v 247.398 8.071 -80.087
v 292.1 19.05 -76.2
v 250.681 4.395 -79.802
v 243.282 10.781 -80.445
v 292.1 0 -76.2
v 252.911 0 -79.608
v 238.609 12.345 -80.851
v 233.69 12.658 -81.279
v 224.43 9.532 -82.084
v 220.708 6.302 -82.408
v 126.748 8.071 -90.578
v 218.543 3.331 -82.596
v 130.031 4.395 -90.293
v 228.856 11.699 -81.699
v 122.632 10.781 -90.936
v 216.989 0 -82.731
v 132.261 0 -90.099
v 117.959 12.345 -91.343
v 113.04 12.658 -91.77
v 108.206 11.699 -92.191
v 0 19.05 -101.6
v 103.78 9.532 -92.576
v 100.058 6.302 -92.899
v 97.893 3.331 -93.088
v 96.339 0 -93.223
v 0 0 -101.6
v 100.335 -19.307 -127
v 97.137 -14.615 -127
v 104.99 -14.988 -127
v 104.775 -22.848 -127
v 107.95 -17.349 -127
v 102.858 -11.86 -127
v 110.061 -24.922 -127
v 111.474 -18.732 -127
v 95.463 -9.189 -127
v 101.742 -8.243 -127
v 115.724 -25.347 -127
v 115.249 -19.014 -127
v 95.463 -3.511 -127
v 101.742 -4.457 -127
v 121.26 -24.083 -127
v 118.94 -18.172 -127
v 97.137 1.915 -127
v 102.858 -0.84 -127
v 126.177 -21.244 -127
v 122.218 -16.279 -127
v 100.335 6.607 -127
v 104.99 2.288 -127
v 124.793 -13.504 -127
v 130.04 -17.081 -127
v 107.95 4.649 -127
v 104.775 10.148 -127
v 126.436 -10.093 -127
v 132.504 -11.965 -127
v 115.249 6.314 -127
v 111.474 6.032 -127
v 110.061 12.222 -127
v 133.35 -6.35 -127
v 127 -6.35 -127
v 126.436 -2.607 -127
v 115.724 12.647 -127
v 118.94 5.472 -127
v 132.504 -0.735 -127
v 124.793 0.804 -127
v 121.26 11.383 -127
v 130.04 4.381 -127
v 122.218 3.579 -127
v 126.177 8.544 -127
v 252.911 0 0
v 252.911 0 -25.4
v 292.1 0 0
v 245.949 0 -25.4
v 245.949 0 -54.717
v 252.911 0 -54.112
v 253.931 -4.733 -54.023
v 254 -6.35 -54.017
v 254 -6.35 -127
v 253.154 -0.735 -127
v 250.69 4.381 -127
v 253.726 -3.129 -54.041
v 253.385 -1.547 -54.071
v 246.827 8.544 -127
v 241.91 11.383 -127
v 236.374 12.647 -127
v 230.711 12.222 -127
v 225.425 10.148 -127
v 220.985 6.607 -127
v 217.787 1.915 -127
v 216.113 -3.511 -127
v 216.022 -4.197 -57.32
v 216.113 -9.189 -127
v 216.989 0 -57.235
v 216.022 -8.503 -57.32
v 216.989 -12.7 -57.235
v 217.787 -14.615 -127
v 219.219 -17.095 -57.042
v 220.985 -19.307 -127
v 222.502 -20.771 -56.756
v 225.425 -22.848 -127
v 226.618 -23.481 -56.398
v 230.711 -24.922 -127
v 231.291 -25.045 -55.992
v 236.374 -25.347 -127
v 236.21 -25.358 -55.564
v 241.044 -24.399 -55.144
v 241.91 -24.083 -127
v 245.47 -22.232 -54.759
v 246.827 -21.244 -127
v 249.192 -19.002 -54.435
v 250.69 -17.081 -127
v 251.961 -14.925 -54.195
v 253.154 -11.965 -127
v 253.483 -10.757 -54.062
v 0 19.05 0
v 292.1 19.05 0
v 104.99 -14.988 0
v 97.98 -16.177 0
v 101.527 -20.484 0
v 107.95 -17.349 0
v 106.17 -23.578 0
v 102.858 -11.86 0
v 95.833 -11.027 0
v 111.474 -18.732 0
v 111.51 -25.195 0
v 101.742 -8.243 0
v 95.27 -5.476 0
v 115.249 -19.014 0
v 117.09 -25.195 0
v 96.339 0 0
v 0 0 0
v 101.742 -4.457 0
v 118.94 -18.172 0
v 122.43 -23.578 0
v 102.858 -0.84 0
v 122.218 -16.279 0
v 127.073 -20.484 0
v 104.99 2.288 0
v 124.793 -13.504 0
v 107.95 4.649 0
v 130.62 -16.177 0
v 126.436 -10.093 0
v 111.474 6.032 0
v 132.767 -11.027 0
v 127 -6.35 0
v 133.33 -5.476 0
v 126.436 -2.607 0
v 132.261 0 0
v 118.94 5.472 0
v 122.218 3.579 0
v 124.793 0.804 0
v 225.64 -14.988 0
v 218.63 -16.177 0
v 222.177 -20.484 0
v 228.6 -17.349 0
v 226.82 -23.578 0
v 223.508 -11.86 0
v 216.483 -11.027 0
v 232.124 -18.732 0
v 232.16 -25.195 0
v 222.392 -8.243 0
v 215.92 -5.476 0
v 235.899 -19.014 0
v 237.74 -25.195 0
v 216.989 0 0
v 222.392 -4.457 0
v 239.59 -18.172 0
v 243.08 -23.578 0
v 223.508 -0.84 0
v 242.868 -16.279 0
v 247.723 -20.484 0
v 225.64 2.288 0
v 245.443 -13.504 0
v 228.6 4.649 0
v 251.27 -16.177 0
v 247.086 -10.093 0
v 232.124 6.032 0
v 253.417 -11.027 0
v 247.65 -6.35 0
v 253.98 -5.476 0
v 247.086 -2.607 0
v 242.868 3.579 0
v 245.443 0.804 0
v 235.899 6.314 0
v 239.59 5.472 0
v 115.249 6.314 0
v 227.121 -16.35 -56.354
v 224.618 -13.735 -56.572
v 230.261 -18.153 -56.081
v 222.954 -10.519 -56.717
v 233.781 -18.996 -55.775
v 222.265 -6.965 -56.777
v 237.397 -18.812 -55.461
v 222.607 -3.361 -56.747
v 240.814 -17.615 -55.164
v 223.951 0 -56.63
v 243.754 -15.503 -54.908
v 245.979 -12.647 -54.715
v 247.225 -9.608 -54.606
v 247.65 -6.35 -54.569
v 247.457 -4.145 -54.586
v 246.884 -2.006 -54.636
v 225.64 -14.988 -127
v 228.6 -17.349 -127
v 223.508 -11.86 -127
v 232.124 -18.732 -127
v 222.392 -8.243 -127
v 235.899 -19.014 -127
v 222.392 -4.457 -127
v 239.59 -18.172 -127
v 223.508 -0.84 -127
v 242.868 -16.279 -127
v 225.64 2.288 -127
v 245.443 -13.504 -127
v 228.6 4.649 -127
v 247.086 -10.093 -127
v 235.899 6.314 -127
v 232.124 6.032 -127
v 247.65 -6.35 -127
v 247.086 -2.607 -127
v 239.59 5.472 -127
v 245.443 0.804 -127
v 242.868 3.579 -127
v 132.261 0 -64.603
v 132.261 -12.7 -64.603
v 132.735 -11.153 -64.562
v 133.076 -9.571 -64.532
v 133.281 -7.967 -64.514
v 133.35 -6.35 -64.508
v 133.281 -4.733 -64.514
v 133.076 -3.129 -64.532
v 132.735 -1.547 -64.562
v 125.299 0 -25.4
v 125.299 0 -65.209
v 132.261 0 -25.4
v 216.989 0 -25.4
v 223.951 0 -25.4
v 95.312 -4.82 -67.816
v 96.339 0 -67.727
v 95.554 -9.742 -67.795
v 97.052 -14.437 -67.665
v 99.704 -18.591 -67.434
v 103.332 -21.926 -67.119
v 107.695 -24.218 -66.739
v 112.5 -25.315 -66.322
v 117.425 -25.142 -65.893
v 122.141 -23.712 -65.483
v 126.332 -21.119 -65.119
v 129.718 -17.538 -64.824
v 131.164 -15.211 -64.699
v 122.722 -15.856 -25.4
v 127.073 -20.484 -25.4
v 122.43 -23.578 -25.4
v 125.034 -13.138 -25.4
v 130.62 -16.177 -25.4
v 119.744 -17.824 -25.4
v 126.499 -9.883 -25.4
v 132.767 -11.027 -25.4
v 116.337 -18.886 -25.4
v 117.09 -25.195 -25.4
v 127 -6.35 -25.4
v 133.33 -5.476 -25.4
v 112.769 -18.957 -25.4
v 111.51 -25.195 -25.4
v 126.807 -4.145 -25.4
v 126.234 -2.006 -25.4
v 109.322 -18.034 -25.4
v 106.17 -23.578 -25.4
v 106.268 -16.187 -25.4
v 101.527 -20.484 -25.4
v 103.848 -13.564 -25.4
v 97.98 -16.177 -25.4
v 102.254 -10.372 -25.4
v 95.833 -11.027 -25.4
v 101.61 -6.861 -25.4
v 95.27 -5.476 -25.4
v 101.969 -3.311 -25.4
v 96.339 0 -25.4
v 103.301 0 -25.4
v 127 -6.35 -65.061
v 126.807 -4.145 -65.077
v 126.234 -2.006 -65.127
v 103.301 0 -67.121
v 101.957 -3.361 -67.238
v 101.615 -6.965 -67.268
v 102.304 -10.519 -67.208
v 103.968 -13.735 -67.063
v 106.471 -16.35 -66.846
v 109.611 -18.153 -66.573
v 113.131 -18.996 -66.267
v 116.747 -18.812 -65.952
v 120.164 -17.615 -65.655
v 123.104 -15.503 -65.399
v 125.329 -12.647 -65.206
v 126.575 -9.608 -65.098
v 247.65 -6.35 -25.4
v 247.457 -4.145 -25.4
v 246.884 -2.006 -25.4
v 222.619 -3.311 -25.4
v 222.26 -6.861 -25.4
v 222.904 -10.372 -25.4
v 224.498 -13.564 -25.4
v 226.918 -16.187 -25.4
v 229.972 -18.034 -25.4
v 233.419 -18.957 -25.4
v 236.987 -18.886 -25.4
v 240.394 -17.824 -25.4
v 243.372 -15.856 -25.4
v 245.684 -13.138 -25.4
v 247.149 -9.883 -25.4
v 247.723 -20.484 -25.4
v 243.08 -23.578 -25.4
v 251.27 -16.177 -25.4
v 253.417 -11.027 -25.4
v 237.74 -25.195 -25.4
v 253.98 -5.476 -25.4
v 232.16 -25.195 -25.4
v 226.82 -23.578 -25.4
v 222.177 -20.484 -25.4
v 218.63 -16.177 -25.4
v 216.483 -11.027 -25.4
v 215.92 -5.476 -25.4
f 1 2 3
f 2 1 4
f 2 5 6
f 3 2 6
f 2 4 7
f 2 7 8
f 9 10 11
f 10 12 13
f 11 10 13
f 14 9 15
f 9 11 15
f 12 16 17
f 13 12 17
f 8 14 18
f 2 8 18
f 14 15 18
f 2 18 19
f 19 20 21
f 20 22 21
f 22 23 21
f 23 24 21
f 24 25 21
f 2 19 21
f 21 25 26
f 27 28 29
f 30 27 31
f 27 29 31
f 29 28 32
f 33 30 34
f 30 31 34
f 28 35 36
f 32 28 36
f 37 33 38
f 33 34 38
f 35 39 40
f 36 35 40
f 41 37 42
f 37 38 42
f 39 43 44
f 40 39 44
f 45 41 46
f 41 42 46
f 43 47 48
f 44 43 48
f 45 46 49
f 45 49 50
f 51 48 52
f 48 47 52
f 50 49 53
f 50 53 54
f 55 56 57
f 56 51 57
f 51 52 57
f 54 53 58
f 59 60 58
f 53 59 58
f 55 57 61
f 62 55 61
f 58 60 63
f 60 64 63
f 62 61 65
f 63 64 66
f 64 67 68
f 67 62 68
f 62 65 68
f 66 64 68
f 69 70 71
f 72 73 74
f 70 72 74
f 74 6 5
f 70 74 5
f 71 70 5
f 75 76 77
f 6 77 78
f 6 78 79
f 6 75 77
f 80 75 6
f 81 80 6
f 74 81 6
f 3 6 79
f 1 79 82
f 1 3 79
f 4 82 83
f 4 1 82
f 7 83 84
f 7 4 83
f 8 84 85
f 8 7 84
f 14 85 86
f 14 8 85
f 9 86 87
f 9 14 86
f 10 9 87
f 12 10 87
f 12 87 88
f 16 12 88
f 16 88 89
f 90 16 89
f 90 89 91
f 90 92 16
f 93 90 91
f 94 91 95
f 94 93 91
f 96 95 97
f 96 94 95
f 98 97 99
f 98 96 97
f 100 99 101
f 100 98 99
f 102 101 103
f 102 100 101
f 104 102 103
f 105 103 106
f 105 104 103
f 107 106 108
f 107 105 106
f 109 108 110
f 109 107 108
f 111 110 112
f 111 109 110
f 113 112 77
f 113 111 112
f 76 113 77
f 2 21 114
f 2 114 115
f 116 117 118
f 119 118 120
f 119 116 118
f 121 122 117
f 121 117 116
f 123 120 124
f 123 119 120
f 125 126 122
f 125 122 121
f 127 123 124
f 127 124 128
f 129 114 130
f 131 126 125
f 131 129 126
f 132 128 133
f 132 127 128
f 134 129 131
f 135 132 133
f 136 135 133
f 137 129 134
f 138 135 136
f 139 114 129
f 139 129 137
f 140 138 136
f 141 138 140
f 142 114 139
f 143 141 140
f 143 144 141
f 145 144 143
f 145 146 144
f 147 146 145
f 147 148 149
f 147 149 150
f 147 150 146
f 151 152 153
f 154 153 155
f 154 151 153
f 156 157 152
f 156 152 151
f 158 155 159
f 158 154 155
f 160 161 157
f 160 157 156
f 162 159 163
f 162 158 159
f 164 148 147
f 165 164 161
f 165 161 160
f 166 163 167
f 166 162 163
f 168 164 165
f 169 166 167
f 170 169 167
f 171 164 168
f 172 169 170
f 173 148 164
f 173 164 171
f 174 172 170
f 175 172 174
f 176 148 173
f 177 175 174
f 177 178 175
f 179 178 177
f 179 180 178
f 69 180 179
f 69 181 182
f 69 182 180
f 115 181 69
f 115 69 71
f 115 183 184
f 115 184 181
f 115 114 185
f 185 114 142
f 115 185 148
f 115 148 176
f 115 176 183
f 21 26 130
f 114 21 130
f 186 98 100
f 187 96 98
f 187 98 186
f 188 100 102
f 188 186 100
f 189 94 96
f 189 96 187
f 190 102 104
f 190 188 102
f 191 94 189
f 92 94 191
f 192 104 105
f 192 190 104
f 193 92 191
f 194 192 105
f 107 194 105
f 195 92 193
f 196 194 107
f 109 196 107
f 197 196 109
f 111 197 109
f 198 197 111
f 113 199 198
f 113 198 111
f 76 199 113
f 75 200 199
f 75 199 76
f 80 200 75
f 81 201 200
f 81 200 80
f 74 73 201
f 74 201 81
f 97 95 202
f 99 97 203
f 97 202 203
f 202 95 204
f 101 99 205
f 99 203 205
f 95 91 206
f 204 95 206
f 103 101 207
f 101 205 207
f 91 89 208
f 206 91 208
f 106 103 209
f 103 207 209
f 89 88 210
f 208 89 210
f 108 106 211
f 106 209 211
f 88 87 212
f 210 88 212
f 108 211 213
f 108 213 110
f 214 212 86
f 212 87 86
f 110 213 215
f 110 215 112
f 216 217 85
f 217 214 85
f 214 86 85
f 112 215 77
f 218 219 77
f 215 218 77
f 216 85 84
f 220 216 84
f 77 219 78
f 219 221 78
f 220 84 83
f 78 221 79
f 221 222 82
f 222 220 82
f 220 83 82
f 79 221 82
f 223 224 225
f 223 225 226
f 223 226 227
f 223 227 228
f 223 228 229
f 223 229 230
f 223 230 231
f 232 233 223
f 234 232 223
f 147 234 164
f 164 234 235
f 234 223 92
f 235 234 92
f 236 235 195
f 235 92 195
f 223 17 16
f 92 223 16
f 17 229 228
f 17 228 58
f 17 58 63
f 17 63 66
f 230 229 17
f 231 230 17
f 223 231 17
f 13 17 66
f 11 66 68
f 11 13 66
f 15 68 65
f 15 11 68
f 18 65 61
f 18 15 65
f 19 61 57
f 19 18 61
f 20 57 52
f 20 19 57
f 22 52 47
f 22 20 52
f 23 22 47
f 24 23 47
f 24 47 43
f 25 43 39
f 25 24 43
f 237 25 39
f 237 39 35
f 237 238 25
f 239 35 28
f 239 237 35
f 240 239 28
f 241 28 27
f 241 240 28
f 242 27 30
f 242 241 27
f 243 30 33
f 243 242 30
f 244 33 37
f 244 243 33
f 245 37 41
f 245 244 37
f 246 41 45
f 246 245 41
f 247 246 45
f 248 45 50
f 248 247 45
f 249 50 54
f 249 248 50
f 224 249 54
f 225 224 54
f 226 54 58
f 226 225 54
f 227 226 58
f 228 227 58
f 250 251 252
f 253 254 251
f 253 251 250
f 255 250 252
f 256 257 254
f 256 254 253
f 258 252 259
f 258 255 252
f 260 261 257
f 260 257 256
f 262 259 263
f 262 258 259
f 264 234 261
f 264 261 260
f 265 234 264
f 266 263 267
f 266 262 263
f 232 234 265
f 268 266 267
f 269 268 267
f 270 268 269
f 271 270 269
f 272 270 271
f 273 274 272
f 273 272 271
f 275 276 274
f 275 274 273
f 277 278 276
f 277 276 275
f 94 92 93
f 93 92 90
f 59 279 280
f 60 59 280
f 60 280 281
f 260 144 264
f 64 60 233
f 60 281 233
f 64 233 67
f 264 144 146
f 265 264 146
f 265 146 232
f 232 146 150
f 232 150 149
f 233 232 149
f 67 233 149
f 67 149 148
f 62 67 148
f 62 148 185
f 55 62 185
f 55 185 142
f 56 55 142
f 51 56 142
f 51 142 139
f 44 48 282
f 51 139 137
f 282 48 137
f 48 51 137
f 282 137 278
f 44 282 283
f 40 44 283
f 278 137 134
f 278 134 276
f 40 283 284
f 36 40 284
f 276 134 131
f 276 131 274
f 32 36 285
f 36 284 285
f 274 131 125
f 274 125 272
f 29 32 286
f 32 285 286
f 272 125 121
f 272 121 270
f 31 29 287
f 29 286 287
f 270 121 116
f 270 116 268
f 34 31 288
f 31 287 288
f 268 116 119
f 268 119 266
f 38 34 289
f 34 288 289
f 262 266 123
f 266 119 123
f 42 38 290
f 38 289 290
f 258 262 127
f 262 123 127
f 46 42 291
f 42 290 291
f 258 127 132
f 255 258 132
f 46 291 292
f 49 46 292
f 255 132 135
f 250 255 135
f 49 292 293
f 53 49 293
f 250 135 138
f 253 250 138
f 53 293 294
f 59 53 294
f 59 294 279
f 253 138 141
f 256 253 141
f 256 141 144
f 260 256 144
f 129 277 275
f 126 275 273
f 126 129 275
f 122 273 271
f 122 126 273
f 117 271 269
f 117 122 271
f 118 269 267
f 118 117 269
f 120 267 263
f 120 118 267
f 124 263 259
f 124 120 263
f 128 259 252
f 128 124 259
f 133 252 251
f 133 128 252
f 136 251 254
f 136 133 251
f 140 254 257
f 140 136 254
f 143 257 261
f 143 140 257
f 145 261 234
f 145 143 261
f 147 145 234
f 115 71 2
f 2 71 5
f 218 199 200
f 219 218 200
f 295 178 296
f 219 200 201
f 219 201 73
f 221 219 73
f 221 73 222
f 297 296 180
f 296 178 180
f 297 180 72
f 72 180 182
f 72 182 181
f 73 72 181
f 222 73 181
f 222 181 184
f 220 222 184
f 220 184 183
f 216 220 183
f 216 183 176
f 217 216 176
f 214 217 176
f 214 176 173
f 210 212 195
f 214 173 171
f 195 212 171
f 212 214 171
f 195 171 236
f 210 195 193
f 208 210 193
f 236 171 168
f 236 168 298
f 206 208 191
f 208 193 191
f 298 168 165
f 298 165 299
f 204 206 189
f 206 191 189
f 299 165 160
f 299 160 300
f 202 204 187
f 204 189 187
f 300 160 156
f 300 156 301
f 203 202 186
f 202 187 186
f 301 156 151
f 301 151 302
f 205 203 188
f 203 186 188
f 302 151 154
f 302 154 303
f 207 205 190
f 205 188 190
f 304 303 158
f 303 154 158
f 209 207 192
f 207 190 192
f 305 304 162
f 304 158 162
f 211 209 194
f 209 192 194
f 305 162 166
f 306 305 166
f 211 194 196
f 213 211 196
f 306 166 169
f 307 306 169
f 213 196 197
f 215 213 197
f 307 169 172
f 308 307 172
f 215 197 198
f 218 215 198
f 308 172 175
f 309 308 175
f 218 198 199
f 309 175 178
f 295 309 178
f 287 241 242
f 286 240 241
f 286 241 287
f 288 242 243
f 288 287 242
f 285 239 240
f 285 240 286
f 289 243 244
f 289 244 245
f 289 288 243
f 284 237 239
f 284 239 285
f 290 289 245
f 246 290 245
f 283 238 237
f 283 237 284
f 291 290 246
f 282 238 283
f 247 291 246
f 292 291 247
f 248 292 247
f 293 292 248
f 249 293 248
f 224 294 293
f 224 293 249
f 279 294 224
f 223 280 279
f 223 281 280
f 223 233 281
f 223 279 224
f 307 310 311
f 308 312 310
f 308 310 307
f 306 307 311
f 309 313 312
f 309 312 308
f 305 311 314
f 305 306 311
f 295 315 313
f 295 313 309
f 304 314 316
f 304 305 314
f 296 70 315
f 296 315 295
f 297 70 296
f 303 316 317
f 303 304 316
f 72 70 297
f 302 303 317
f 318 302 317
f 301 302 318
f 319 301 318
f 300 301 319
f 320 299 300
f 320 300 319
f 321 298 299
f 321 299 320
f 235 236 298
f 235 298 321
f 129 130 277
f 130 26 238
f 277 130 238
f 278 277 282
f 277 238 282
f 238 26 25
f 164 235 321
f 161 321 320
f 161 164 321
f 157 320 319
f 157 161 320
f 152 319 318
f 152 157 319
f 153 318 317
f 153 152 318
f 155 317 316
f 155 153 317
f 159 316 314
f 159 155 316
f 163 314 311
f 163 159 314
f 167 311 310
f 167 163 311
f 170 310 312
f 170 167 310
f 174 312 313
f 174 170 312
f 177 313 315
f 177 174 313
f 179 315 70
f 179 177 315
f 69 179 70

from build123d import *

# Parameters (mm, degrees)
BOSS_EXTRUDE1_DEPTH = 19.05
SKETCH6_R           = 19.05
SKETCH6_R_2         = 12.7
BOSS_EXTRUDE3_DEPTH = 127
CUT_EXTRUDE1_REACH  = 321.526
SKETCH7_R           = 12.7
CUT_EXTRUDE2_DEPTH  = 320.525538885


with BuildPart() as part:
    # Sketch1 → Boss-Extrude1 (new body)
    with BuildSketch(Plane(origin=(0, 0, 0), x_dir=(1, 0, 0), z_dir=(0, 1, 0))):
        Polygon((292.1, 76.2), (0, 101.6), (0, 0), (292.1, 0), align=None)
    extrude(amount=BOSS_EXTRUDE1_DEPTH)

    # Sketch6 → Boss-Extrude3 (add)
    # profile 1 of 2: a face of its own
    with BuildSketch(Plane.XY):
        with Locations((114.3, -6.35)):
            Circle(SKETCH6_R)
        with Locations((114.3, -6.35)):
            Circle(SKETCH6_R_2, mode=Mode.SUBTRACT)
    # profile 2 of 2: a face of its own
    with BuildSketch(Plane.XY):
        with Locations((234.95, -6.35)):
            Circle(SKETCH6_R)
        with Locations((234.95, -6.35)):
            Circle(SKETCH6_R_2, mode=Mode.SUBTRACT)
    extrude(amount=-BOSS_EXTRUDE3_DEPTH)

    # Cut-Extrude1: up to this face of the body (flat: up to its plane)
    cut_extrude1_end = Plane(part.part.faces().sort_by_distance((142.169333517, 10.10414021, -89.237449259))[0])
    # Sketch7 → Cut-Extrude1 (cut, up to the picked face)
    with BuildSketch(Plane.XY, mode=Mode.PRIVATE) as cut_extrude1_sk1:
        with Locations((114.3, -6.35)):
            Circle(SKETCH7_R)
    cut_extrude1_tool1 = split(extrude(cut_extrude1_sk1.sketch, amount=-CUT_EXTRUDE1_REACH, mode=Mode.PRIVATE), bisect_by=cut_extrude1_end, keep=Keep.BOTH, mode=Mode.PRIVATE)
    # Sketch7 → Cut-Extrude1 (cut, up to the picked face)
    with BuildSketch(Plane.XY, mode=Mode.PRIVATE) as cut_extrude1_sk2:
        with Locations((234.95, -6.35)):
            Circle(SKETCH7_R)
    cut_extrude1_tool2 = split(extrude(cut_extrude1_sk2.sketch, amount=-CUT_EXTRUDE1_REACH, mode=Mode.PRIVATE), bisect_by=cut_extrude1_end, keep=Keep.BOTH, mode=Mode.PRIVATE)
    add(cut_extrude1_tool1.solids().sort_by(Axis((114.3, -6.35, 0), (0, 0, -1)))[0], mode=Mode.SUBTRACT)
    add(cut_extrude1_tool2.solids().sort_by(Axis((234.95, -6.35, 0), (0, 0, -1)))[0], mode=Mode.SUBTRACT)

    # Sketch8 → Cut-Extrude2 (cut, through all)
    with BuildSketch(Plane.XZ):
        Polygon((132.260512242, -25.4), (0, -25.4), (0, -76.104150603), (132.260512242, -64.603236495), align=None)
        Polygon((216.989487758, -25.4), (132.260512242, -25.4), (132.260512242, -64.603236495), (216.989487758, -57.235499493), align=None)
        Polygon((292.1, -25.4), (216.989487758, -25.4), (216.989487758, -57.235499493), (292.1, -50.704150603), align=None)
    extrude(amount=CUT_EXTRUDE2_DEPTH, mode=Mode.SUBTRACT)


solid = part.part
